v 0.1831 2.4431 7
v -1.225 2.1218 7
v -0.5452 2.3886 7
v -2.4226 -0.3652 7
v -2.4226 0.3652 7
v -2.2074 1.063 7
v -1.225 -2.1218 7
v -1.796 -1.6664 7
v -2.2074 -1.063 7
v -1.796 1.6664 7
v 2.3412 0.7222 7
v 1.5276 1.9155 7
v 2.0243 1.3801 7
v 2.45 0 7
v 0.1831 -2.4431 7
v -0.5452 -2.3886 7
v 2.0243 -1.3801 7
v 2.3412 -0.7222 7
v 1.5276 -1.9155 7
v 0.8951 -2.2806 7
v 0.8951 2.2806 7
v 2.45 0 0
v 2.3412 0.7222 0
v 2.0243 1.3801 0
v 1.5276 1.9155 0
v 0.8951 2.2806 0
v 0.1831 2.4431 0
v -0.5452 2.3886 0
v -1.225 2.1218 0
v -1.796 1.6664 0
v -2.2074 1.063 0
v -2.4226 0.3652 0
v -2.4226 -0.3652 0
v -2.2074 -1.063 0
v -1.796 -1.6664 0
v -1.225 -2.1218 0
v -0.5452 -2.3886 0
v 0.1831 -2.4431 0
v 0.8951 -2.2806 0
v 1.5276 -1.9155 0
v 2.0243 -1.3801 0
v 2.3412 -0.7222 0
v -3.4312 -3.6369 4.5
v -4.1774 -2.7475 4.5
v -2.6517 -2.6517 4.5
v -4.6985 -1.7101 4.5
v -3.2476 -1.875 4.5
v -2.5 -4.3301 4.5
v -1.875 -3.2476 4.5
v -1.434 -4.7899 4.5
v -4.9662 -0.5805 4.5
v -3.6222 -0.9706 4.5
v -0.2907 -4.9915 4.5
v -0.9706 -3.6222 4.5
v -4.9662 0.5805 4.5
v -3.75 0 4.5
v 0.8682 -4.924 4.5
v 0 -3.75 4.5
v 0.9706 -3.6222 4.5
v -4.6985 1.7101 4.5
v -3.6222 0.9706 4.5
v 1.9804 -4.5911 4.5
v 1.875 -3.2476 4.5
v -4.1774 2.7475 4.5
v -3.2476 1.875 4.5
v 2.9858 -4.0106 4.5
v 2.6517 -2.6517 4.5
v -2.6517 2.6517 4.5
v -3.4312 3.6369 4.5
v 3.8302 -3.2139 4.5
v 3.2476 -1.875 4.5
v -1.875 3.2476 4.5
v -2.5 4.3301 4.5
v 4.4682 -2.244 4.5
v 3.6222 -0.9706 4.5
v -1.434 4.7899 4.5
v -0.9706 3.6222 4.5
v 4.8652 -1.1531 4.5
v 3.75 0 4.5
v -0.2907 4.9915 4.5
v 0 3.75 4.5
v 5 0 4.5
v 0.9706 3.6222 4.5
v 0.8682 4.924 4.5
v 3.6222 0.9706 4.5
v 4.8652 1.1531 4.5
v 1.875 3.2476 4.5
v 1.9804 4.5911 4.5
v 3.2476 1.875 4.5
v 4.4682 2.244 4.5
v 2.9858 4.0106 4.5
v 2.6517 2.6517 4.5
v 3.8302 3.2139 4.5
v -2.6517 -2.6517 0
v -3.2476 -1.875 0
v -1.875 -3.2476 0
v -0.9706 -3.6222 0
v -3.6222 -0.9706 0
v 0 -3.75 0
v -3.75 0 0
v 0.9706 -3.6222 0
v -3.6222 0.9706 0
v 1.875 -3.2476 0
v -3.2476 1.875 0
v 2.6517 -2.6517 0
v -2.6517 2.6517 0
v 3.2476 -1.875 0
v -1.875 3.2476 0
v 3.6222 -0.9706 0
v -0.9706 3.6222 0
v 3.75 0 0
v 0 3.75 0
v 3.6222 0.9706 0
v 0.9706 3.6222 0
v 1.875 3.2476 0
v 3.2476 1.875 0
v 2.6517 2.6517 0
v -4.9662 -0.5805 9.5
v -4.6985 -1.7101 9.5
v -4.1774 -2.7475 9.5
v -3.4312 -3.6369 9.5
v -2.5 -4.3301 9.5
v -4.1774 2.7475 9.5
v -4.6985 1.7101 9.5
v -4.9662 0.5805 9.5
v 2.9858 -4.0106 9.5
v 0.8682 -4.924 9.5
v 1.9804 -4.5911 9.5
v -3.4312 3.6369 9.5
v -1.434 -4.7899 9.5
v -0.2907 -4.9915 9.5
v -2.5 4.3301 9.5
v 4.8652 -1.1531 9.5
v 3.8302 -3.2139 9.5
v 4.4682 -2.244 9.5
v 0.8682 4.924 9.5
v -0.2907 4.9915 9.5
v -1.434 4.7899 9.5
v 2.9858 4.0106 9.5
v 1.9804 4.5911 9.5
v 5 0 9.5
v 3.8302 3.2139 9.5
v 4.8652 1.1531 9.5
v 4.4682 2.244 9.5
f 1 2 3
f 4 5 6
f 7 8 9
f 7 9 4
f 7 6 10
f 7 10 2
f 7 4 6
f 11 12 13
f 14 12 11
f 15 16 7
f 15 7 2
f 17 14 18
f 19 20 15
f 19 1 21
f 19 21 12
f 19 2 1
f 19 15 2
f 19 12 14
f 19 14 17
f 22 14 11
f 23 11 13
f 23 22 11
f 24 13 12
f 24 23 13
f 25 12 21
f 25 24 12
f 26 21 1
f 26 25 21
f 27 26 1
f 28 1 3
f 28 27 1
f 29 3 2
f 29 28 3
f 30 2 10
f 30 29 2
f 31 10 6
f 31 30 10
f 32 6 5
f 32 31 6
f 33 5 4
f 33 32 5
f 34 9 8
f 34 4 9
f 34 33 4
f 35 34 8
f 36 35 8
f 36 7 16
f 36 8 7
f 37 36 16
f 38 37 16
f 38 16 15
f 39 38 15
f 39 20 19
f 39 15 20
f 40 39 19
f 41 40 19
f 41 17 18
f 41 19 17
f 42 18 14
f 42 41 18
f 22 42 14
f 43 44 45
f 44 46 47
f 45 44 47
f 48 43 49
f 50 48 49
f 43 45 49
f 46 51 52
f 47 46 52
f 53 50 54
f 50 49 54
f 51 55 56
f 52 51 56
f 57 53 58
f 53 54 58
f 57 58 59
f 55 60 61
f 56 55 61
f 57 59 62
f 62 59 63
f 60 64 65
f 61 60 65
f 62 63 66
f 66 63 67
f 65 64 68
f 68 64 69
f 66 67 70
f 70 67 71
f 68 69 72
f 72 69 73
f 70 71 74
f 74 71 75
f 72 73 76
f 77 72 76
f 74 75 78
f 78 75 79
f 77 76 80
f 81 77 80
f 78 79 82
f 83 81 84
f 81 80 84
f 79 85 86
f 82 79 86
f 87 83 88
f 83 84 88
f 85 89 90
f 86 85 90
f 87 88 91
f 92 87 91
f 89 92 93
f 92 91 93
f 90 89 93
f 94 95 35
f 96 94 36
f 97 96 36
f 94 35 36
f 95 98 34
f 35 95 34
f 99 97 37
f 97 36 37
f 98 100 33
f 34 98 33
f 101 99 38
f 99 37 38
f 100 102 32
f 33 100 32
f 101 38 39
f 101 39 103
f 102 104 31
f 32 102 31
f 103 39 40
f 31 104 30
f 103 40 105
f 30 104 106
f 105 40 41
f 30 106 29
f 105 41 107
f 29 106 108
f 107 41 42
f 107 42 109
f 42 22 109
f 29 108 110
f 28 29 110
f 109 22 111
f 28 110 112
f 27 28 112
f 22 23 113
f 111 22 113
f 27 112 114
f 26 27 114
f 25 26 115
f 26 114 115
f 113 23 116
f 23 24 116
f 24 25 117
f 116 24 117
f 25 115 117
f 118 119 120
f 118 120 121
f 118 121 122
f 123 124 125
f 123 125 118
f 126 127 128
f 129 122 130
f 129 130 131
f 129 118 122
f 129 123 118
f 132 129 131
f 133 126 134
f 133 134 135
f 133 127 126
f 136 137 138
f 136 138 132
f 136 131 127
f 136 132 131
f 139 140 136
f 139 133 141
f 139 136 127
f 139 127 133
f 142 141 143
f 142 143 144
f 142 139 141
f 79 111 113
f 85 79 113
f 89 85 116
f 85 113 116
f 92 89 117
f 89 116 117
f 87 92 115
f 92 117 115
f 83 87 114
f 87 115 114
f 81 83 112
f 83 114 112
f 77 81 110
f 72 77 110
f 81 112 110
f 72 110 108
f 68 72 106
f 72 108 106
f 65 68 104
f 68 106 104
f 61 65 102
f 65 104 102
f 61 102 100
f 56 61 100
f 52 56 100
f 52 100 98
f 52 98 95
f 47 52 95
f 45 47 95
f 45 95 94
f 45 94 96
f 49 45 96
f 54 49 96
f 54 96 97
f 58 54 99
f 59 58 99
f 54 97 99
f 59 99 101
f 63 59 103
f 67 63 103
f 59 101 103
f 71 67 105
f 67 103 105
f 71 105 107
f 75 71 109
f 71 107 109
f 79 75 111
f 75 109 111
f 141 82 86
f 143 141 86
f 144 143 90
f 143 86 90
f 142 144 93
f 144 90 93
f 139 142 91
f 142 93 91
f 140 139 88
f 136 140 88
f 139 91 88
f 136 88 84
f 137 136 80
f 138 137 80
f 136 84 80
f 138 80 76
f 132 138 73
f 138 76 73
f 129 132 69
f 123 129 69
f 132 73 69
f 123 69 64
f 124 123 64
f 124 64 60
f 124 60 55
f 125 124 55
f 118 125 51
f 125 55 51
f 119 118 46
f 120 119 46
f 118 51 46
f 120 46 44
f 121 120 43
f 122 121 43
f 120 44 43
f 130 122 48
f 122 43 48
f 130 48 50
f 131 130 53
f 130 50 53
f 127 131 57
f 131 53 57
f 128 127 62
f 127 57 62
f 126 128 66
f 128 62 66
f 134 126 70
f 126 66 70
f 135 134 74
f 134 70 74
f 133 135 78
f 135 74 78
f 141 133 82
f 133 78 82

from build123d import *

# Parameters (mm, degrees)
F0_R     = 3.75
F0_R_2   = 2.45
F1_DEPTH = 4.5
F2_R     = 5
F3_DEPTH = 5
F4_R     = 2.45
F5_DEPTH = 2.5


with BuildPart() as f1:
    # F0 (on Top) → F1 (new body)
    with BuildSketch(Plane.XY):
        Circle(F0_R)
        Circle(F0_R_2, mode=Mode.SUBTRACT)
    extrude(amount=F1_DEPTH)

    # F2 (on face) → F3 (join)
    with BuildSketch(Plane.XY.offset(4.5)):
        Circle(F2_R)
    extrude(amount=F3_DEPTH)

    # F4 (on face) → F5 (cut)
    with BuildSketch(Plane(origin=(0, 0, 4.5), x_dir=(1, 0, 0), z_dir=(0, 0, -1))):
        Circle(F4_R)
    extrude(amount=-F5_DEPTH, mode=Mode.SUBTRACT)


solid = f1.part
